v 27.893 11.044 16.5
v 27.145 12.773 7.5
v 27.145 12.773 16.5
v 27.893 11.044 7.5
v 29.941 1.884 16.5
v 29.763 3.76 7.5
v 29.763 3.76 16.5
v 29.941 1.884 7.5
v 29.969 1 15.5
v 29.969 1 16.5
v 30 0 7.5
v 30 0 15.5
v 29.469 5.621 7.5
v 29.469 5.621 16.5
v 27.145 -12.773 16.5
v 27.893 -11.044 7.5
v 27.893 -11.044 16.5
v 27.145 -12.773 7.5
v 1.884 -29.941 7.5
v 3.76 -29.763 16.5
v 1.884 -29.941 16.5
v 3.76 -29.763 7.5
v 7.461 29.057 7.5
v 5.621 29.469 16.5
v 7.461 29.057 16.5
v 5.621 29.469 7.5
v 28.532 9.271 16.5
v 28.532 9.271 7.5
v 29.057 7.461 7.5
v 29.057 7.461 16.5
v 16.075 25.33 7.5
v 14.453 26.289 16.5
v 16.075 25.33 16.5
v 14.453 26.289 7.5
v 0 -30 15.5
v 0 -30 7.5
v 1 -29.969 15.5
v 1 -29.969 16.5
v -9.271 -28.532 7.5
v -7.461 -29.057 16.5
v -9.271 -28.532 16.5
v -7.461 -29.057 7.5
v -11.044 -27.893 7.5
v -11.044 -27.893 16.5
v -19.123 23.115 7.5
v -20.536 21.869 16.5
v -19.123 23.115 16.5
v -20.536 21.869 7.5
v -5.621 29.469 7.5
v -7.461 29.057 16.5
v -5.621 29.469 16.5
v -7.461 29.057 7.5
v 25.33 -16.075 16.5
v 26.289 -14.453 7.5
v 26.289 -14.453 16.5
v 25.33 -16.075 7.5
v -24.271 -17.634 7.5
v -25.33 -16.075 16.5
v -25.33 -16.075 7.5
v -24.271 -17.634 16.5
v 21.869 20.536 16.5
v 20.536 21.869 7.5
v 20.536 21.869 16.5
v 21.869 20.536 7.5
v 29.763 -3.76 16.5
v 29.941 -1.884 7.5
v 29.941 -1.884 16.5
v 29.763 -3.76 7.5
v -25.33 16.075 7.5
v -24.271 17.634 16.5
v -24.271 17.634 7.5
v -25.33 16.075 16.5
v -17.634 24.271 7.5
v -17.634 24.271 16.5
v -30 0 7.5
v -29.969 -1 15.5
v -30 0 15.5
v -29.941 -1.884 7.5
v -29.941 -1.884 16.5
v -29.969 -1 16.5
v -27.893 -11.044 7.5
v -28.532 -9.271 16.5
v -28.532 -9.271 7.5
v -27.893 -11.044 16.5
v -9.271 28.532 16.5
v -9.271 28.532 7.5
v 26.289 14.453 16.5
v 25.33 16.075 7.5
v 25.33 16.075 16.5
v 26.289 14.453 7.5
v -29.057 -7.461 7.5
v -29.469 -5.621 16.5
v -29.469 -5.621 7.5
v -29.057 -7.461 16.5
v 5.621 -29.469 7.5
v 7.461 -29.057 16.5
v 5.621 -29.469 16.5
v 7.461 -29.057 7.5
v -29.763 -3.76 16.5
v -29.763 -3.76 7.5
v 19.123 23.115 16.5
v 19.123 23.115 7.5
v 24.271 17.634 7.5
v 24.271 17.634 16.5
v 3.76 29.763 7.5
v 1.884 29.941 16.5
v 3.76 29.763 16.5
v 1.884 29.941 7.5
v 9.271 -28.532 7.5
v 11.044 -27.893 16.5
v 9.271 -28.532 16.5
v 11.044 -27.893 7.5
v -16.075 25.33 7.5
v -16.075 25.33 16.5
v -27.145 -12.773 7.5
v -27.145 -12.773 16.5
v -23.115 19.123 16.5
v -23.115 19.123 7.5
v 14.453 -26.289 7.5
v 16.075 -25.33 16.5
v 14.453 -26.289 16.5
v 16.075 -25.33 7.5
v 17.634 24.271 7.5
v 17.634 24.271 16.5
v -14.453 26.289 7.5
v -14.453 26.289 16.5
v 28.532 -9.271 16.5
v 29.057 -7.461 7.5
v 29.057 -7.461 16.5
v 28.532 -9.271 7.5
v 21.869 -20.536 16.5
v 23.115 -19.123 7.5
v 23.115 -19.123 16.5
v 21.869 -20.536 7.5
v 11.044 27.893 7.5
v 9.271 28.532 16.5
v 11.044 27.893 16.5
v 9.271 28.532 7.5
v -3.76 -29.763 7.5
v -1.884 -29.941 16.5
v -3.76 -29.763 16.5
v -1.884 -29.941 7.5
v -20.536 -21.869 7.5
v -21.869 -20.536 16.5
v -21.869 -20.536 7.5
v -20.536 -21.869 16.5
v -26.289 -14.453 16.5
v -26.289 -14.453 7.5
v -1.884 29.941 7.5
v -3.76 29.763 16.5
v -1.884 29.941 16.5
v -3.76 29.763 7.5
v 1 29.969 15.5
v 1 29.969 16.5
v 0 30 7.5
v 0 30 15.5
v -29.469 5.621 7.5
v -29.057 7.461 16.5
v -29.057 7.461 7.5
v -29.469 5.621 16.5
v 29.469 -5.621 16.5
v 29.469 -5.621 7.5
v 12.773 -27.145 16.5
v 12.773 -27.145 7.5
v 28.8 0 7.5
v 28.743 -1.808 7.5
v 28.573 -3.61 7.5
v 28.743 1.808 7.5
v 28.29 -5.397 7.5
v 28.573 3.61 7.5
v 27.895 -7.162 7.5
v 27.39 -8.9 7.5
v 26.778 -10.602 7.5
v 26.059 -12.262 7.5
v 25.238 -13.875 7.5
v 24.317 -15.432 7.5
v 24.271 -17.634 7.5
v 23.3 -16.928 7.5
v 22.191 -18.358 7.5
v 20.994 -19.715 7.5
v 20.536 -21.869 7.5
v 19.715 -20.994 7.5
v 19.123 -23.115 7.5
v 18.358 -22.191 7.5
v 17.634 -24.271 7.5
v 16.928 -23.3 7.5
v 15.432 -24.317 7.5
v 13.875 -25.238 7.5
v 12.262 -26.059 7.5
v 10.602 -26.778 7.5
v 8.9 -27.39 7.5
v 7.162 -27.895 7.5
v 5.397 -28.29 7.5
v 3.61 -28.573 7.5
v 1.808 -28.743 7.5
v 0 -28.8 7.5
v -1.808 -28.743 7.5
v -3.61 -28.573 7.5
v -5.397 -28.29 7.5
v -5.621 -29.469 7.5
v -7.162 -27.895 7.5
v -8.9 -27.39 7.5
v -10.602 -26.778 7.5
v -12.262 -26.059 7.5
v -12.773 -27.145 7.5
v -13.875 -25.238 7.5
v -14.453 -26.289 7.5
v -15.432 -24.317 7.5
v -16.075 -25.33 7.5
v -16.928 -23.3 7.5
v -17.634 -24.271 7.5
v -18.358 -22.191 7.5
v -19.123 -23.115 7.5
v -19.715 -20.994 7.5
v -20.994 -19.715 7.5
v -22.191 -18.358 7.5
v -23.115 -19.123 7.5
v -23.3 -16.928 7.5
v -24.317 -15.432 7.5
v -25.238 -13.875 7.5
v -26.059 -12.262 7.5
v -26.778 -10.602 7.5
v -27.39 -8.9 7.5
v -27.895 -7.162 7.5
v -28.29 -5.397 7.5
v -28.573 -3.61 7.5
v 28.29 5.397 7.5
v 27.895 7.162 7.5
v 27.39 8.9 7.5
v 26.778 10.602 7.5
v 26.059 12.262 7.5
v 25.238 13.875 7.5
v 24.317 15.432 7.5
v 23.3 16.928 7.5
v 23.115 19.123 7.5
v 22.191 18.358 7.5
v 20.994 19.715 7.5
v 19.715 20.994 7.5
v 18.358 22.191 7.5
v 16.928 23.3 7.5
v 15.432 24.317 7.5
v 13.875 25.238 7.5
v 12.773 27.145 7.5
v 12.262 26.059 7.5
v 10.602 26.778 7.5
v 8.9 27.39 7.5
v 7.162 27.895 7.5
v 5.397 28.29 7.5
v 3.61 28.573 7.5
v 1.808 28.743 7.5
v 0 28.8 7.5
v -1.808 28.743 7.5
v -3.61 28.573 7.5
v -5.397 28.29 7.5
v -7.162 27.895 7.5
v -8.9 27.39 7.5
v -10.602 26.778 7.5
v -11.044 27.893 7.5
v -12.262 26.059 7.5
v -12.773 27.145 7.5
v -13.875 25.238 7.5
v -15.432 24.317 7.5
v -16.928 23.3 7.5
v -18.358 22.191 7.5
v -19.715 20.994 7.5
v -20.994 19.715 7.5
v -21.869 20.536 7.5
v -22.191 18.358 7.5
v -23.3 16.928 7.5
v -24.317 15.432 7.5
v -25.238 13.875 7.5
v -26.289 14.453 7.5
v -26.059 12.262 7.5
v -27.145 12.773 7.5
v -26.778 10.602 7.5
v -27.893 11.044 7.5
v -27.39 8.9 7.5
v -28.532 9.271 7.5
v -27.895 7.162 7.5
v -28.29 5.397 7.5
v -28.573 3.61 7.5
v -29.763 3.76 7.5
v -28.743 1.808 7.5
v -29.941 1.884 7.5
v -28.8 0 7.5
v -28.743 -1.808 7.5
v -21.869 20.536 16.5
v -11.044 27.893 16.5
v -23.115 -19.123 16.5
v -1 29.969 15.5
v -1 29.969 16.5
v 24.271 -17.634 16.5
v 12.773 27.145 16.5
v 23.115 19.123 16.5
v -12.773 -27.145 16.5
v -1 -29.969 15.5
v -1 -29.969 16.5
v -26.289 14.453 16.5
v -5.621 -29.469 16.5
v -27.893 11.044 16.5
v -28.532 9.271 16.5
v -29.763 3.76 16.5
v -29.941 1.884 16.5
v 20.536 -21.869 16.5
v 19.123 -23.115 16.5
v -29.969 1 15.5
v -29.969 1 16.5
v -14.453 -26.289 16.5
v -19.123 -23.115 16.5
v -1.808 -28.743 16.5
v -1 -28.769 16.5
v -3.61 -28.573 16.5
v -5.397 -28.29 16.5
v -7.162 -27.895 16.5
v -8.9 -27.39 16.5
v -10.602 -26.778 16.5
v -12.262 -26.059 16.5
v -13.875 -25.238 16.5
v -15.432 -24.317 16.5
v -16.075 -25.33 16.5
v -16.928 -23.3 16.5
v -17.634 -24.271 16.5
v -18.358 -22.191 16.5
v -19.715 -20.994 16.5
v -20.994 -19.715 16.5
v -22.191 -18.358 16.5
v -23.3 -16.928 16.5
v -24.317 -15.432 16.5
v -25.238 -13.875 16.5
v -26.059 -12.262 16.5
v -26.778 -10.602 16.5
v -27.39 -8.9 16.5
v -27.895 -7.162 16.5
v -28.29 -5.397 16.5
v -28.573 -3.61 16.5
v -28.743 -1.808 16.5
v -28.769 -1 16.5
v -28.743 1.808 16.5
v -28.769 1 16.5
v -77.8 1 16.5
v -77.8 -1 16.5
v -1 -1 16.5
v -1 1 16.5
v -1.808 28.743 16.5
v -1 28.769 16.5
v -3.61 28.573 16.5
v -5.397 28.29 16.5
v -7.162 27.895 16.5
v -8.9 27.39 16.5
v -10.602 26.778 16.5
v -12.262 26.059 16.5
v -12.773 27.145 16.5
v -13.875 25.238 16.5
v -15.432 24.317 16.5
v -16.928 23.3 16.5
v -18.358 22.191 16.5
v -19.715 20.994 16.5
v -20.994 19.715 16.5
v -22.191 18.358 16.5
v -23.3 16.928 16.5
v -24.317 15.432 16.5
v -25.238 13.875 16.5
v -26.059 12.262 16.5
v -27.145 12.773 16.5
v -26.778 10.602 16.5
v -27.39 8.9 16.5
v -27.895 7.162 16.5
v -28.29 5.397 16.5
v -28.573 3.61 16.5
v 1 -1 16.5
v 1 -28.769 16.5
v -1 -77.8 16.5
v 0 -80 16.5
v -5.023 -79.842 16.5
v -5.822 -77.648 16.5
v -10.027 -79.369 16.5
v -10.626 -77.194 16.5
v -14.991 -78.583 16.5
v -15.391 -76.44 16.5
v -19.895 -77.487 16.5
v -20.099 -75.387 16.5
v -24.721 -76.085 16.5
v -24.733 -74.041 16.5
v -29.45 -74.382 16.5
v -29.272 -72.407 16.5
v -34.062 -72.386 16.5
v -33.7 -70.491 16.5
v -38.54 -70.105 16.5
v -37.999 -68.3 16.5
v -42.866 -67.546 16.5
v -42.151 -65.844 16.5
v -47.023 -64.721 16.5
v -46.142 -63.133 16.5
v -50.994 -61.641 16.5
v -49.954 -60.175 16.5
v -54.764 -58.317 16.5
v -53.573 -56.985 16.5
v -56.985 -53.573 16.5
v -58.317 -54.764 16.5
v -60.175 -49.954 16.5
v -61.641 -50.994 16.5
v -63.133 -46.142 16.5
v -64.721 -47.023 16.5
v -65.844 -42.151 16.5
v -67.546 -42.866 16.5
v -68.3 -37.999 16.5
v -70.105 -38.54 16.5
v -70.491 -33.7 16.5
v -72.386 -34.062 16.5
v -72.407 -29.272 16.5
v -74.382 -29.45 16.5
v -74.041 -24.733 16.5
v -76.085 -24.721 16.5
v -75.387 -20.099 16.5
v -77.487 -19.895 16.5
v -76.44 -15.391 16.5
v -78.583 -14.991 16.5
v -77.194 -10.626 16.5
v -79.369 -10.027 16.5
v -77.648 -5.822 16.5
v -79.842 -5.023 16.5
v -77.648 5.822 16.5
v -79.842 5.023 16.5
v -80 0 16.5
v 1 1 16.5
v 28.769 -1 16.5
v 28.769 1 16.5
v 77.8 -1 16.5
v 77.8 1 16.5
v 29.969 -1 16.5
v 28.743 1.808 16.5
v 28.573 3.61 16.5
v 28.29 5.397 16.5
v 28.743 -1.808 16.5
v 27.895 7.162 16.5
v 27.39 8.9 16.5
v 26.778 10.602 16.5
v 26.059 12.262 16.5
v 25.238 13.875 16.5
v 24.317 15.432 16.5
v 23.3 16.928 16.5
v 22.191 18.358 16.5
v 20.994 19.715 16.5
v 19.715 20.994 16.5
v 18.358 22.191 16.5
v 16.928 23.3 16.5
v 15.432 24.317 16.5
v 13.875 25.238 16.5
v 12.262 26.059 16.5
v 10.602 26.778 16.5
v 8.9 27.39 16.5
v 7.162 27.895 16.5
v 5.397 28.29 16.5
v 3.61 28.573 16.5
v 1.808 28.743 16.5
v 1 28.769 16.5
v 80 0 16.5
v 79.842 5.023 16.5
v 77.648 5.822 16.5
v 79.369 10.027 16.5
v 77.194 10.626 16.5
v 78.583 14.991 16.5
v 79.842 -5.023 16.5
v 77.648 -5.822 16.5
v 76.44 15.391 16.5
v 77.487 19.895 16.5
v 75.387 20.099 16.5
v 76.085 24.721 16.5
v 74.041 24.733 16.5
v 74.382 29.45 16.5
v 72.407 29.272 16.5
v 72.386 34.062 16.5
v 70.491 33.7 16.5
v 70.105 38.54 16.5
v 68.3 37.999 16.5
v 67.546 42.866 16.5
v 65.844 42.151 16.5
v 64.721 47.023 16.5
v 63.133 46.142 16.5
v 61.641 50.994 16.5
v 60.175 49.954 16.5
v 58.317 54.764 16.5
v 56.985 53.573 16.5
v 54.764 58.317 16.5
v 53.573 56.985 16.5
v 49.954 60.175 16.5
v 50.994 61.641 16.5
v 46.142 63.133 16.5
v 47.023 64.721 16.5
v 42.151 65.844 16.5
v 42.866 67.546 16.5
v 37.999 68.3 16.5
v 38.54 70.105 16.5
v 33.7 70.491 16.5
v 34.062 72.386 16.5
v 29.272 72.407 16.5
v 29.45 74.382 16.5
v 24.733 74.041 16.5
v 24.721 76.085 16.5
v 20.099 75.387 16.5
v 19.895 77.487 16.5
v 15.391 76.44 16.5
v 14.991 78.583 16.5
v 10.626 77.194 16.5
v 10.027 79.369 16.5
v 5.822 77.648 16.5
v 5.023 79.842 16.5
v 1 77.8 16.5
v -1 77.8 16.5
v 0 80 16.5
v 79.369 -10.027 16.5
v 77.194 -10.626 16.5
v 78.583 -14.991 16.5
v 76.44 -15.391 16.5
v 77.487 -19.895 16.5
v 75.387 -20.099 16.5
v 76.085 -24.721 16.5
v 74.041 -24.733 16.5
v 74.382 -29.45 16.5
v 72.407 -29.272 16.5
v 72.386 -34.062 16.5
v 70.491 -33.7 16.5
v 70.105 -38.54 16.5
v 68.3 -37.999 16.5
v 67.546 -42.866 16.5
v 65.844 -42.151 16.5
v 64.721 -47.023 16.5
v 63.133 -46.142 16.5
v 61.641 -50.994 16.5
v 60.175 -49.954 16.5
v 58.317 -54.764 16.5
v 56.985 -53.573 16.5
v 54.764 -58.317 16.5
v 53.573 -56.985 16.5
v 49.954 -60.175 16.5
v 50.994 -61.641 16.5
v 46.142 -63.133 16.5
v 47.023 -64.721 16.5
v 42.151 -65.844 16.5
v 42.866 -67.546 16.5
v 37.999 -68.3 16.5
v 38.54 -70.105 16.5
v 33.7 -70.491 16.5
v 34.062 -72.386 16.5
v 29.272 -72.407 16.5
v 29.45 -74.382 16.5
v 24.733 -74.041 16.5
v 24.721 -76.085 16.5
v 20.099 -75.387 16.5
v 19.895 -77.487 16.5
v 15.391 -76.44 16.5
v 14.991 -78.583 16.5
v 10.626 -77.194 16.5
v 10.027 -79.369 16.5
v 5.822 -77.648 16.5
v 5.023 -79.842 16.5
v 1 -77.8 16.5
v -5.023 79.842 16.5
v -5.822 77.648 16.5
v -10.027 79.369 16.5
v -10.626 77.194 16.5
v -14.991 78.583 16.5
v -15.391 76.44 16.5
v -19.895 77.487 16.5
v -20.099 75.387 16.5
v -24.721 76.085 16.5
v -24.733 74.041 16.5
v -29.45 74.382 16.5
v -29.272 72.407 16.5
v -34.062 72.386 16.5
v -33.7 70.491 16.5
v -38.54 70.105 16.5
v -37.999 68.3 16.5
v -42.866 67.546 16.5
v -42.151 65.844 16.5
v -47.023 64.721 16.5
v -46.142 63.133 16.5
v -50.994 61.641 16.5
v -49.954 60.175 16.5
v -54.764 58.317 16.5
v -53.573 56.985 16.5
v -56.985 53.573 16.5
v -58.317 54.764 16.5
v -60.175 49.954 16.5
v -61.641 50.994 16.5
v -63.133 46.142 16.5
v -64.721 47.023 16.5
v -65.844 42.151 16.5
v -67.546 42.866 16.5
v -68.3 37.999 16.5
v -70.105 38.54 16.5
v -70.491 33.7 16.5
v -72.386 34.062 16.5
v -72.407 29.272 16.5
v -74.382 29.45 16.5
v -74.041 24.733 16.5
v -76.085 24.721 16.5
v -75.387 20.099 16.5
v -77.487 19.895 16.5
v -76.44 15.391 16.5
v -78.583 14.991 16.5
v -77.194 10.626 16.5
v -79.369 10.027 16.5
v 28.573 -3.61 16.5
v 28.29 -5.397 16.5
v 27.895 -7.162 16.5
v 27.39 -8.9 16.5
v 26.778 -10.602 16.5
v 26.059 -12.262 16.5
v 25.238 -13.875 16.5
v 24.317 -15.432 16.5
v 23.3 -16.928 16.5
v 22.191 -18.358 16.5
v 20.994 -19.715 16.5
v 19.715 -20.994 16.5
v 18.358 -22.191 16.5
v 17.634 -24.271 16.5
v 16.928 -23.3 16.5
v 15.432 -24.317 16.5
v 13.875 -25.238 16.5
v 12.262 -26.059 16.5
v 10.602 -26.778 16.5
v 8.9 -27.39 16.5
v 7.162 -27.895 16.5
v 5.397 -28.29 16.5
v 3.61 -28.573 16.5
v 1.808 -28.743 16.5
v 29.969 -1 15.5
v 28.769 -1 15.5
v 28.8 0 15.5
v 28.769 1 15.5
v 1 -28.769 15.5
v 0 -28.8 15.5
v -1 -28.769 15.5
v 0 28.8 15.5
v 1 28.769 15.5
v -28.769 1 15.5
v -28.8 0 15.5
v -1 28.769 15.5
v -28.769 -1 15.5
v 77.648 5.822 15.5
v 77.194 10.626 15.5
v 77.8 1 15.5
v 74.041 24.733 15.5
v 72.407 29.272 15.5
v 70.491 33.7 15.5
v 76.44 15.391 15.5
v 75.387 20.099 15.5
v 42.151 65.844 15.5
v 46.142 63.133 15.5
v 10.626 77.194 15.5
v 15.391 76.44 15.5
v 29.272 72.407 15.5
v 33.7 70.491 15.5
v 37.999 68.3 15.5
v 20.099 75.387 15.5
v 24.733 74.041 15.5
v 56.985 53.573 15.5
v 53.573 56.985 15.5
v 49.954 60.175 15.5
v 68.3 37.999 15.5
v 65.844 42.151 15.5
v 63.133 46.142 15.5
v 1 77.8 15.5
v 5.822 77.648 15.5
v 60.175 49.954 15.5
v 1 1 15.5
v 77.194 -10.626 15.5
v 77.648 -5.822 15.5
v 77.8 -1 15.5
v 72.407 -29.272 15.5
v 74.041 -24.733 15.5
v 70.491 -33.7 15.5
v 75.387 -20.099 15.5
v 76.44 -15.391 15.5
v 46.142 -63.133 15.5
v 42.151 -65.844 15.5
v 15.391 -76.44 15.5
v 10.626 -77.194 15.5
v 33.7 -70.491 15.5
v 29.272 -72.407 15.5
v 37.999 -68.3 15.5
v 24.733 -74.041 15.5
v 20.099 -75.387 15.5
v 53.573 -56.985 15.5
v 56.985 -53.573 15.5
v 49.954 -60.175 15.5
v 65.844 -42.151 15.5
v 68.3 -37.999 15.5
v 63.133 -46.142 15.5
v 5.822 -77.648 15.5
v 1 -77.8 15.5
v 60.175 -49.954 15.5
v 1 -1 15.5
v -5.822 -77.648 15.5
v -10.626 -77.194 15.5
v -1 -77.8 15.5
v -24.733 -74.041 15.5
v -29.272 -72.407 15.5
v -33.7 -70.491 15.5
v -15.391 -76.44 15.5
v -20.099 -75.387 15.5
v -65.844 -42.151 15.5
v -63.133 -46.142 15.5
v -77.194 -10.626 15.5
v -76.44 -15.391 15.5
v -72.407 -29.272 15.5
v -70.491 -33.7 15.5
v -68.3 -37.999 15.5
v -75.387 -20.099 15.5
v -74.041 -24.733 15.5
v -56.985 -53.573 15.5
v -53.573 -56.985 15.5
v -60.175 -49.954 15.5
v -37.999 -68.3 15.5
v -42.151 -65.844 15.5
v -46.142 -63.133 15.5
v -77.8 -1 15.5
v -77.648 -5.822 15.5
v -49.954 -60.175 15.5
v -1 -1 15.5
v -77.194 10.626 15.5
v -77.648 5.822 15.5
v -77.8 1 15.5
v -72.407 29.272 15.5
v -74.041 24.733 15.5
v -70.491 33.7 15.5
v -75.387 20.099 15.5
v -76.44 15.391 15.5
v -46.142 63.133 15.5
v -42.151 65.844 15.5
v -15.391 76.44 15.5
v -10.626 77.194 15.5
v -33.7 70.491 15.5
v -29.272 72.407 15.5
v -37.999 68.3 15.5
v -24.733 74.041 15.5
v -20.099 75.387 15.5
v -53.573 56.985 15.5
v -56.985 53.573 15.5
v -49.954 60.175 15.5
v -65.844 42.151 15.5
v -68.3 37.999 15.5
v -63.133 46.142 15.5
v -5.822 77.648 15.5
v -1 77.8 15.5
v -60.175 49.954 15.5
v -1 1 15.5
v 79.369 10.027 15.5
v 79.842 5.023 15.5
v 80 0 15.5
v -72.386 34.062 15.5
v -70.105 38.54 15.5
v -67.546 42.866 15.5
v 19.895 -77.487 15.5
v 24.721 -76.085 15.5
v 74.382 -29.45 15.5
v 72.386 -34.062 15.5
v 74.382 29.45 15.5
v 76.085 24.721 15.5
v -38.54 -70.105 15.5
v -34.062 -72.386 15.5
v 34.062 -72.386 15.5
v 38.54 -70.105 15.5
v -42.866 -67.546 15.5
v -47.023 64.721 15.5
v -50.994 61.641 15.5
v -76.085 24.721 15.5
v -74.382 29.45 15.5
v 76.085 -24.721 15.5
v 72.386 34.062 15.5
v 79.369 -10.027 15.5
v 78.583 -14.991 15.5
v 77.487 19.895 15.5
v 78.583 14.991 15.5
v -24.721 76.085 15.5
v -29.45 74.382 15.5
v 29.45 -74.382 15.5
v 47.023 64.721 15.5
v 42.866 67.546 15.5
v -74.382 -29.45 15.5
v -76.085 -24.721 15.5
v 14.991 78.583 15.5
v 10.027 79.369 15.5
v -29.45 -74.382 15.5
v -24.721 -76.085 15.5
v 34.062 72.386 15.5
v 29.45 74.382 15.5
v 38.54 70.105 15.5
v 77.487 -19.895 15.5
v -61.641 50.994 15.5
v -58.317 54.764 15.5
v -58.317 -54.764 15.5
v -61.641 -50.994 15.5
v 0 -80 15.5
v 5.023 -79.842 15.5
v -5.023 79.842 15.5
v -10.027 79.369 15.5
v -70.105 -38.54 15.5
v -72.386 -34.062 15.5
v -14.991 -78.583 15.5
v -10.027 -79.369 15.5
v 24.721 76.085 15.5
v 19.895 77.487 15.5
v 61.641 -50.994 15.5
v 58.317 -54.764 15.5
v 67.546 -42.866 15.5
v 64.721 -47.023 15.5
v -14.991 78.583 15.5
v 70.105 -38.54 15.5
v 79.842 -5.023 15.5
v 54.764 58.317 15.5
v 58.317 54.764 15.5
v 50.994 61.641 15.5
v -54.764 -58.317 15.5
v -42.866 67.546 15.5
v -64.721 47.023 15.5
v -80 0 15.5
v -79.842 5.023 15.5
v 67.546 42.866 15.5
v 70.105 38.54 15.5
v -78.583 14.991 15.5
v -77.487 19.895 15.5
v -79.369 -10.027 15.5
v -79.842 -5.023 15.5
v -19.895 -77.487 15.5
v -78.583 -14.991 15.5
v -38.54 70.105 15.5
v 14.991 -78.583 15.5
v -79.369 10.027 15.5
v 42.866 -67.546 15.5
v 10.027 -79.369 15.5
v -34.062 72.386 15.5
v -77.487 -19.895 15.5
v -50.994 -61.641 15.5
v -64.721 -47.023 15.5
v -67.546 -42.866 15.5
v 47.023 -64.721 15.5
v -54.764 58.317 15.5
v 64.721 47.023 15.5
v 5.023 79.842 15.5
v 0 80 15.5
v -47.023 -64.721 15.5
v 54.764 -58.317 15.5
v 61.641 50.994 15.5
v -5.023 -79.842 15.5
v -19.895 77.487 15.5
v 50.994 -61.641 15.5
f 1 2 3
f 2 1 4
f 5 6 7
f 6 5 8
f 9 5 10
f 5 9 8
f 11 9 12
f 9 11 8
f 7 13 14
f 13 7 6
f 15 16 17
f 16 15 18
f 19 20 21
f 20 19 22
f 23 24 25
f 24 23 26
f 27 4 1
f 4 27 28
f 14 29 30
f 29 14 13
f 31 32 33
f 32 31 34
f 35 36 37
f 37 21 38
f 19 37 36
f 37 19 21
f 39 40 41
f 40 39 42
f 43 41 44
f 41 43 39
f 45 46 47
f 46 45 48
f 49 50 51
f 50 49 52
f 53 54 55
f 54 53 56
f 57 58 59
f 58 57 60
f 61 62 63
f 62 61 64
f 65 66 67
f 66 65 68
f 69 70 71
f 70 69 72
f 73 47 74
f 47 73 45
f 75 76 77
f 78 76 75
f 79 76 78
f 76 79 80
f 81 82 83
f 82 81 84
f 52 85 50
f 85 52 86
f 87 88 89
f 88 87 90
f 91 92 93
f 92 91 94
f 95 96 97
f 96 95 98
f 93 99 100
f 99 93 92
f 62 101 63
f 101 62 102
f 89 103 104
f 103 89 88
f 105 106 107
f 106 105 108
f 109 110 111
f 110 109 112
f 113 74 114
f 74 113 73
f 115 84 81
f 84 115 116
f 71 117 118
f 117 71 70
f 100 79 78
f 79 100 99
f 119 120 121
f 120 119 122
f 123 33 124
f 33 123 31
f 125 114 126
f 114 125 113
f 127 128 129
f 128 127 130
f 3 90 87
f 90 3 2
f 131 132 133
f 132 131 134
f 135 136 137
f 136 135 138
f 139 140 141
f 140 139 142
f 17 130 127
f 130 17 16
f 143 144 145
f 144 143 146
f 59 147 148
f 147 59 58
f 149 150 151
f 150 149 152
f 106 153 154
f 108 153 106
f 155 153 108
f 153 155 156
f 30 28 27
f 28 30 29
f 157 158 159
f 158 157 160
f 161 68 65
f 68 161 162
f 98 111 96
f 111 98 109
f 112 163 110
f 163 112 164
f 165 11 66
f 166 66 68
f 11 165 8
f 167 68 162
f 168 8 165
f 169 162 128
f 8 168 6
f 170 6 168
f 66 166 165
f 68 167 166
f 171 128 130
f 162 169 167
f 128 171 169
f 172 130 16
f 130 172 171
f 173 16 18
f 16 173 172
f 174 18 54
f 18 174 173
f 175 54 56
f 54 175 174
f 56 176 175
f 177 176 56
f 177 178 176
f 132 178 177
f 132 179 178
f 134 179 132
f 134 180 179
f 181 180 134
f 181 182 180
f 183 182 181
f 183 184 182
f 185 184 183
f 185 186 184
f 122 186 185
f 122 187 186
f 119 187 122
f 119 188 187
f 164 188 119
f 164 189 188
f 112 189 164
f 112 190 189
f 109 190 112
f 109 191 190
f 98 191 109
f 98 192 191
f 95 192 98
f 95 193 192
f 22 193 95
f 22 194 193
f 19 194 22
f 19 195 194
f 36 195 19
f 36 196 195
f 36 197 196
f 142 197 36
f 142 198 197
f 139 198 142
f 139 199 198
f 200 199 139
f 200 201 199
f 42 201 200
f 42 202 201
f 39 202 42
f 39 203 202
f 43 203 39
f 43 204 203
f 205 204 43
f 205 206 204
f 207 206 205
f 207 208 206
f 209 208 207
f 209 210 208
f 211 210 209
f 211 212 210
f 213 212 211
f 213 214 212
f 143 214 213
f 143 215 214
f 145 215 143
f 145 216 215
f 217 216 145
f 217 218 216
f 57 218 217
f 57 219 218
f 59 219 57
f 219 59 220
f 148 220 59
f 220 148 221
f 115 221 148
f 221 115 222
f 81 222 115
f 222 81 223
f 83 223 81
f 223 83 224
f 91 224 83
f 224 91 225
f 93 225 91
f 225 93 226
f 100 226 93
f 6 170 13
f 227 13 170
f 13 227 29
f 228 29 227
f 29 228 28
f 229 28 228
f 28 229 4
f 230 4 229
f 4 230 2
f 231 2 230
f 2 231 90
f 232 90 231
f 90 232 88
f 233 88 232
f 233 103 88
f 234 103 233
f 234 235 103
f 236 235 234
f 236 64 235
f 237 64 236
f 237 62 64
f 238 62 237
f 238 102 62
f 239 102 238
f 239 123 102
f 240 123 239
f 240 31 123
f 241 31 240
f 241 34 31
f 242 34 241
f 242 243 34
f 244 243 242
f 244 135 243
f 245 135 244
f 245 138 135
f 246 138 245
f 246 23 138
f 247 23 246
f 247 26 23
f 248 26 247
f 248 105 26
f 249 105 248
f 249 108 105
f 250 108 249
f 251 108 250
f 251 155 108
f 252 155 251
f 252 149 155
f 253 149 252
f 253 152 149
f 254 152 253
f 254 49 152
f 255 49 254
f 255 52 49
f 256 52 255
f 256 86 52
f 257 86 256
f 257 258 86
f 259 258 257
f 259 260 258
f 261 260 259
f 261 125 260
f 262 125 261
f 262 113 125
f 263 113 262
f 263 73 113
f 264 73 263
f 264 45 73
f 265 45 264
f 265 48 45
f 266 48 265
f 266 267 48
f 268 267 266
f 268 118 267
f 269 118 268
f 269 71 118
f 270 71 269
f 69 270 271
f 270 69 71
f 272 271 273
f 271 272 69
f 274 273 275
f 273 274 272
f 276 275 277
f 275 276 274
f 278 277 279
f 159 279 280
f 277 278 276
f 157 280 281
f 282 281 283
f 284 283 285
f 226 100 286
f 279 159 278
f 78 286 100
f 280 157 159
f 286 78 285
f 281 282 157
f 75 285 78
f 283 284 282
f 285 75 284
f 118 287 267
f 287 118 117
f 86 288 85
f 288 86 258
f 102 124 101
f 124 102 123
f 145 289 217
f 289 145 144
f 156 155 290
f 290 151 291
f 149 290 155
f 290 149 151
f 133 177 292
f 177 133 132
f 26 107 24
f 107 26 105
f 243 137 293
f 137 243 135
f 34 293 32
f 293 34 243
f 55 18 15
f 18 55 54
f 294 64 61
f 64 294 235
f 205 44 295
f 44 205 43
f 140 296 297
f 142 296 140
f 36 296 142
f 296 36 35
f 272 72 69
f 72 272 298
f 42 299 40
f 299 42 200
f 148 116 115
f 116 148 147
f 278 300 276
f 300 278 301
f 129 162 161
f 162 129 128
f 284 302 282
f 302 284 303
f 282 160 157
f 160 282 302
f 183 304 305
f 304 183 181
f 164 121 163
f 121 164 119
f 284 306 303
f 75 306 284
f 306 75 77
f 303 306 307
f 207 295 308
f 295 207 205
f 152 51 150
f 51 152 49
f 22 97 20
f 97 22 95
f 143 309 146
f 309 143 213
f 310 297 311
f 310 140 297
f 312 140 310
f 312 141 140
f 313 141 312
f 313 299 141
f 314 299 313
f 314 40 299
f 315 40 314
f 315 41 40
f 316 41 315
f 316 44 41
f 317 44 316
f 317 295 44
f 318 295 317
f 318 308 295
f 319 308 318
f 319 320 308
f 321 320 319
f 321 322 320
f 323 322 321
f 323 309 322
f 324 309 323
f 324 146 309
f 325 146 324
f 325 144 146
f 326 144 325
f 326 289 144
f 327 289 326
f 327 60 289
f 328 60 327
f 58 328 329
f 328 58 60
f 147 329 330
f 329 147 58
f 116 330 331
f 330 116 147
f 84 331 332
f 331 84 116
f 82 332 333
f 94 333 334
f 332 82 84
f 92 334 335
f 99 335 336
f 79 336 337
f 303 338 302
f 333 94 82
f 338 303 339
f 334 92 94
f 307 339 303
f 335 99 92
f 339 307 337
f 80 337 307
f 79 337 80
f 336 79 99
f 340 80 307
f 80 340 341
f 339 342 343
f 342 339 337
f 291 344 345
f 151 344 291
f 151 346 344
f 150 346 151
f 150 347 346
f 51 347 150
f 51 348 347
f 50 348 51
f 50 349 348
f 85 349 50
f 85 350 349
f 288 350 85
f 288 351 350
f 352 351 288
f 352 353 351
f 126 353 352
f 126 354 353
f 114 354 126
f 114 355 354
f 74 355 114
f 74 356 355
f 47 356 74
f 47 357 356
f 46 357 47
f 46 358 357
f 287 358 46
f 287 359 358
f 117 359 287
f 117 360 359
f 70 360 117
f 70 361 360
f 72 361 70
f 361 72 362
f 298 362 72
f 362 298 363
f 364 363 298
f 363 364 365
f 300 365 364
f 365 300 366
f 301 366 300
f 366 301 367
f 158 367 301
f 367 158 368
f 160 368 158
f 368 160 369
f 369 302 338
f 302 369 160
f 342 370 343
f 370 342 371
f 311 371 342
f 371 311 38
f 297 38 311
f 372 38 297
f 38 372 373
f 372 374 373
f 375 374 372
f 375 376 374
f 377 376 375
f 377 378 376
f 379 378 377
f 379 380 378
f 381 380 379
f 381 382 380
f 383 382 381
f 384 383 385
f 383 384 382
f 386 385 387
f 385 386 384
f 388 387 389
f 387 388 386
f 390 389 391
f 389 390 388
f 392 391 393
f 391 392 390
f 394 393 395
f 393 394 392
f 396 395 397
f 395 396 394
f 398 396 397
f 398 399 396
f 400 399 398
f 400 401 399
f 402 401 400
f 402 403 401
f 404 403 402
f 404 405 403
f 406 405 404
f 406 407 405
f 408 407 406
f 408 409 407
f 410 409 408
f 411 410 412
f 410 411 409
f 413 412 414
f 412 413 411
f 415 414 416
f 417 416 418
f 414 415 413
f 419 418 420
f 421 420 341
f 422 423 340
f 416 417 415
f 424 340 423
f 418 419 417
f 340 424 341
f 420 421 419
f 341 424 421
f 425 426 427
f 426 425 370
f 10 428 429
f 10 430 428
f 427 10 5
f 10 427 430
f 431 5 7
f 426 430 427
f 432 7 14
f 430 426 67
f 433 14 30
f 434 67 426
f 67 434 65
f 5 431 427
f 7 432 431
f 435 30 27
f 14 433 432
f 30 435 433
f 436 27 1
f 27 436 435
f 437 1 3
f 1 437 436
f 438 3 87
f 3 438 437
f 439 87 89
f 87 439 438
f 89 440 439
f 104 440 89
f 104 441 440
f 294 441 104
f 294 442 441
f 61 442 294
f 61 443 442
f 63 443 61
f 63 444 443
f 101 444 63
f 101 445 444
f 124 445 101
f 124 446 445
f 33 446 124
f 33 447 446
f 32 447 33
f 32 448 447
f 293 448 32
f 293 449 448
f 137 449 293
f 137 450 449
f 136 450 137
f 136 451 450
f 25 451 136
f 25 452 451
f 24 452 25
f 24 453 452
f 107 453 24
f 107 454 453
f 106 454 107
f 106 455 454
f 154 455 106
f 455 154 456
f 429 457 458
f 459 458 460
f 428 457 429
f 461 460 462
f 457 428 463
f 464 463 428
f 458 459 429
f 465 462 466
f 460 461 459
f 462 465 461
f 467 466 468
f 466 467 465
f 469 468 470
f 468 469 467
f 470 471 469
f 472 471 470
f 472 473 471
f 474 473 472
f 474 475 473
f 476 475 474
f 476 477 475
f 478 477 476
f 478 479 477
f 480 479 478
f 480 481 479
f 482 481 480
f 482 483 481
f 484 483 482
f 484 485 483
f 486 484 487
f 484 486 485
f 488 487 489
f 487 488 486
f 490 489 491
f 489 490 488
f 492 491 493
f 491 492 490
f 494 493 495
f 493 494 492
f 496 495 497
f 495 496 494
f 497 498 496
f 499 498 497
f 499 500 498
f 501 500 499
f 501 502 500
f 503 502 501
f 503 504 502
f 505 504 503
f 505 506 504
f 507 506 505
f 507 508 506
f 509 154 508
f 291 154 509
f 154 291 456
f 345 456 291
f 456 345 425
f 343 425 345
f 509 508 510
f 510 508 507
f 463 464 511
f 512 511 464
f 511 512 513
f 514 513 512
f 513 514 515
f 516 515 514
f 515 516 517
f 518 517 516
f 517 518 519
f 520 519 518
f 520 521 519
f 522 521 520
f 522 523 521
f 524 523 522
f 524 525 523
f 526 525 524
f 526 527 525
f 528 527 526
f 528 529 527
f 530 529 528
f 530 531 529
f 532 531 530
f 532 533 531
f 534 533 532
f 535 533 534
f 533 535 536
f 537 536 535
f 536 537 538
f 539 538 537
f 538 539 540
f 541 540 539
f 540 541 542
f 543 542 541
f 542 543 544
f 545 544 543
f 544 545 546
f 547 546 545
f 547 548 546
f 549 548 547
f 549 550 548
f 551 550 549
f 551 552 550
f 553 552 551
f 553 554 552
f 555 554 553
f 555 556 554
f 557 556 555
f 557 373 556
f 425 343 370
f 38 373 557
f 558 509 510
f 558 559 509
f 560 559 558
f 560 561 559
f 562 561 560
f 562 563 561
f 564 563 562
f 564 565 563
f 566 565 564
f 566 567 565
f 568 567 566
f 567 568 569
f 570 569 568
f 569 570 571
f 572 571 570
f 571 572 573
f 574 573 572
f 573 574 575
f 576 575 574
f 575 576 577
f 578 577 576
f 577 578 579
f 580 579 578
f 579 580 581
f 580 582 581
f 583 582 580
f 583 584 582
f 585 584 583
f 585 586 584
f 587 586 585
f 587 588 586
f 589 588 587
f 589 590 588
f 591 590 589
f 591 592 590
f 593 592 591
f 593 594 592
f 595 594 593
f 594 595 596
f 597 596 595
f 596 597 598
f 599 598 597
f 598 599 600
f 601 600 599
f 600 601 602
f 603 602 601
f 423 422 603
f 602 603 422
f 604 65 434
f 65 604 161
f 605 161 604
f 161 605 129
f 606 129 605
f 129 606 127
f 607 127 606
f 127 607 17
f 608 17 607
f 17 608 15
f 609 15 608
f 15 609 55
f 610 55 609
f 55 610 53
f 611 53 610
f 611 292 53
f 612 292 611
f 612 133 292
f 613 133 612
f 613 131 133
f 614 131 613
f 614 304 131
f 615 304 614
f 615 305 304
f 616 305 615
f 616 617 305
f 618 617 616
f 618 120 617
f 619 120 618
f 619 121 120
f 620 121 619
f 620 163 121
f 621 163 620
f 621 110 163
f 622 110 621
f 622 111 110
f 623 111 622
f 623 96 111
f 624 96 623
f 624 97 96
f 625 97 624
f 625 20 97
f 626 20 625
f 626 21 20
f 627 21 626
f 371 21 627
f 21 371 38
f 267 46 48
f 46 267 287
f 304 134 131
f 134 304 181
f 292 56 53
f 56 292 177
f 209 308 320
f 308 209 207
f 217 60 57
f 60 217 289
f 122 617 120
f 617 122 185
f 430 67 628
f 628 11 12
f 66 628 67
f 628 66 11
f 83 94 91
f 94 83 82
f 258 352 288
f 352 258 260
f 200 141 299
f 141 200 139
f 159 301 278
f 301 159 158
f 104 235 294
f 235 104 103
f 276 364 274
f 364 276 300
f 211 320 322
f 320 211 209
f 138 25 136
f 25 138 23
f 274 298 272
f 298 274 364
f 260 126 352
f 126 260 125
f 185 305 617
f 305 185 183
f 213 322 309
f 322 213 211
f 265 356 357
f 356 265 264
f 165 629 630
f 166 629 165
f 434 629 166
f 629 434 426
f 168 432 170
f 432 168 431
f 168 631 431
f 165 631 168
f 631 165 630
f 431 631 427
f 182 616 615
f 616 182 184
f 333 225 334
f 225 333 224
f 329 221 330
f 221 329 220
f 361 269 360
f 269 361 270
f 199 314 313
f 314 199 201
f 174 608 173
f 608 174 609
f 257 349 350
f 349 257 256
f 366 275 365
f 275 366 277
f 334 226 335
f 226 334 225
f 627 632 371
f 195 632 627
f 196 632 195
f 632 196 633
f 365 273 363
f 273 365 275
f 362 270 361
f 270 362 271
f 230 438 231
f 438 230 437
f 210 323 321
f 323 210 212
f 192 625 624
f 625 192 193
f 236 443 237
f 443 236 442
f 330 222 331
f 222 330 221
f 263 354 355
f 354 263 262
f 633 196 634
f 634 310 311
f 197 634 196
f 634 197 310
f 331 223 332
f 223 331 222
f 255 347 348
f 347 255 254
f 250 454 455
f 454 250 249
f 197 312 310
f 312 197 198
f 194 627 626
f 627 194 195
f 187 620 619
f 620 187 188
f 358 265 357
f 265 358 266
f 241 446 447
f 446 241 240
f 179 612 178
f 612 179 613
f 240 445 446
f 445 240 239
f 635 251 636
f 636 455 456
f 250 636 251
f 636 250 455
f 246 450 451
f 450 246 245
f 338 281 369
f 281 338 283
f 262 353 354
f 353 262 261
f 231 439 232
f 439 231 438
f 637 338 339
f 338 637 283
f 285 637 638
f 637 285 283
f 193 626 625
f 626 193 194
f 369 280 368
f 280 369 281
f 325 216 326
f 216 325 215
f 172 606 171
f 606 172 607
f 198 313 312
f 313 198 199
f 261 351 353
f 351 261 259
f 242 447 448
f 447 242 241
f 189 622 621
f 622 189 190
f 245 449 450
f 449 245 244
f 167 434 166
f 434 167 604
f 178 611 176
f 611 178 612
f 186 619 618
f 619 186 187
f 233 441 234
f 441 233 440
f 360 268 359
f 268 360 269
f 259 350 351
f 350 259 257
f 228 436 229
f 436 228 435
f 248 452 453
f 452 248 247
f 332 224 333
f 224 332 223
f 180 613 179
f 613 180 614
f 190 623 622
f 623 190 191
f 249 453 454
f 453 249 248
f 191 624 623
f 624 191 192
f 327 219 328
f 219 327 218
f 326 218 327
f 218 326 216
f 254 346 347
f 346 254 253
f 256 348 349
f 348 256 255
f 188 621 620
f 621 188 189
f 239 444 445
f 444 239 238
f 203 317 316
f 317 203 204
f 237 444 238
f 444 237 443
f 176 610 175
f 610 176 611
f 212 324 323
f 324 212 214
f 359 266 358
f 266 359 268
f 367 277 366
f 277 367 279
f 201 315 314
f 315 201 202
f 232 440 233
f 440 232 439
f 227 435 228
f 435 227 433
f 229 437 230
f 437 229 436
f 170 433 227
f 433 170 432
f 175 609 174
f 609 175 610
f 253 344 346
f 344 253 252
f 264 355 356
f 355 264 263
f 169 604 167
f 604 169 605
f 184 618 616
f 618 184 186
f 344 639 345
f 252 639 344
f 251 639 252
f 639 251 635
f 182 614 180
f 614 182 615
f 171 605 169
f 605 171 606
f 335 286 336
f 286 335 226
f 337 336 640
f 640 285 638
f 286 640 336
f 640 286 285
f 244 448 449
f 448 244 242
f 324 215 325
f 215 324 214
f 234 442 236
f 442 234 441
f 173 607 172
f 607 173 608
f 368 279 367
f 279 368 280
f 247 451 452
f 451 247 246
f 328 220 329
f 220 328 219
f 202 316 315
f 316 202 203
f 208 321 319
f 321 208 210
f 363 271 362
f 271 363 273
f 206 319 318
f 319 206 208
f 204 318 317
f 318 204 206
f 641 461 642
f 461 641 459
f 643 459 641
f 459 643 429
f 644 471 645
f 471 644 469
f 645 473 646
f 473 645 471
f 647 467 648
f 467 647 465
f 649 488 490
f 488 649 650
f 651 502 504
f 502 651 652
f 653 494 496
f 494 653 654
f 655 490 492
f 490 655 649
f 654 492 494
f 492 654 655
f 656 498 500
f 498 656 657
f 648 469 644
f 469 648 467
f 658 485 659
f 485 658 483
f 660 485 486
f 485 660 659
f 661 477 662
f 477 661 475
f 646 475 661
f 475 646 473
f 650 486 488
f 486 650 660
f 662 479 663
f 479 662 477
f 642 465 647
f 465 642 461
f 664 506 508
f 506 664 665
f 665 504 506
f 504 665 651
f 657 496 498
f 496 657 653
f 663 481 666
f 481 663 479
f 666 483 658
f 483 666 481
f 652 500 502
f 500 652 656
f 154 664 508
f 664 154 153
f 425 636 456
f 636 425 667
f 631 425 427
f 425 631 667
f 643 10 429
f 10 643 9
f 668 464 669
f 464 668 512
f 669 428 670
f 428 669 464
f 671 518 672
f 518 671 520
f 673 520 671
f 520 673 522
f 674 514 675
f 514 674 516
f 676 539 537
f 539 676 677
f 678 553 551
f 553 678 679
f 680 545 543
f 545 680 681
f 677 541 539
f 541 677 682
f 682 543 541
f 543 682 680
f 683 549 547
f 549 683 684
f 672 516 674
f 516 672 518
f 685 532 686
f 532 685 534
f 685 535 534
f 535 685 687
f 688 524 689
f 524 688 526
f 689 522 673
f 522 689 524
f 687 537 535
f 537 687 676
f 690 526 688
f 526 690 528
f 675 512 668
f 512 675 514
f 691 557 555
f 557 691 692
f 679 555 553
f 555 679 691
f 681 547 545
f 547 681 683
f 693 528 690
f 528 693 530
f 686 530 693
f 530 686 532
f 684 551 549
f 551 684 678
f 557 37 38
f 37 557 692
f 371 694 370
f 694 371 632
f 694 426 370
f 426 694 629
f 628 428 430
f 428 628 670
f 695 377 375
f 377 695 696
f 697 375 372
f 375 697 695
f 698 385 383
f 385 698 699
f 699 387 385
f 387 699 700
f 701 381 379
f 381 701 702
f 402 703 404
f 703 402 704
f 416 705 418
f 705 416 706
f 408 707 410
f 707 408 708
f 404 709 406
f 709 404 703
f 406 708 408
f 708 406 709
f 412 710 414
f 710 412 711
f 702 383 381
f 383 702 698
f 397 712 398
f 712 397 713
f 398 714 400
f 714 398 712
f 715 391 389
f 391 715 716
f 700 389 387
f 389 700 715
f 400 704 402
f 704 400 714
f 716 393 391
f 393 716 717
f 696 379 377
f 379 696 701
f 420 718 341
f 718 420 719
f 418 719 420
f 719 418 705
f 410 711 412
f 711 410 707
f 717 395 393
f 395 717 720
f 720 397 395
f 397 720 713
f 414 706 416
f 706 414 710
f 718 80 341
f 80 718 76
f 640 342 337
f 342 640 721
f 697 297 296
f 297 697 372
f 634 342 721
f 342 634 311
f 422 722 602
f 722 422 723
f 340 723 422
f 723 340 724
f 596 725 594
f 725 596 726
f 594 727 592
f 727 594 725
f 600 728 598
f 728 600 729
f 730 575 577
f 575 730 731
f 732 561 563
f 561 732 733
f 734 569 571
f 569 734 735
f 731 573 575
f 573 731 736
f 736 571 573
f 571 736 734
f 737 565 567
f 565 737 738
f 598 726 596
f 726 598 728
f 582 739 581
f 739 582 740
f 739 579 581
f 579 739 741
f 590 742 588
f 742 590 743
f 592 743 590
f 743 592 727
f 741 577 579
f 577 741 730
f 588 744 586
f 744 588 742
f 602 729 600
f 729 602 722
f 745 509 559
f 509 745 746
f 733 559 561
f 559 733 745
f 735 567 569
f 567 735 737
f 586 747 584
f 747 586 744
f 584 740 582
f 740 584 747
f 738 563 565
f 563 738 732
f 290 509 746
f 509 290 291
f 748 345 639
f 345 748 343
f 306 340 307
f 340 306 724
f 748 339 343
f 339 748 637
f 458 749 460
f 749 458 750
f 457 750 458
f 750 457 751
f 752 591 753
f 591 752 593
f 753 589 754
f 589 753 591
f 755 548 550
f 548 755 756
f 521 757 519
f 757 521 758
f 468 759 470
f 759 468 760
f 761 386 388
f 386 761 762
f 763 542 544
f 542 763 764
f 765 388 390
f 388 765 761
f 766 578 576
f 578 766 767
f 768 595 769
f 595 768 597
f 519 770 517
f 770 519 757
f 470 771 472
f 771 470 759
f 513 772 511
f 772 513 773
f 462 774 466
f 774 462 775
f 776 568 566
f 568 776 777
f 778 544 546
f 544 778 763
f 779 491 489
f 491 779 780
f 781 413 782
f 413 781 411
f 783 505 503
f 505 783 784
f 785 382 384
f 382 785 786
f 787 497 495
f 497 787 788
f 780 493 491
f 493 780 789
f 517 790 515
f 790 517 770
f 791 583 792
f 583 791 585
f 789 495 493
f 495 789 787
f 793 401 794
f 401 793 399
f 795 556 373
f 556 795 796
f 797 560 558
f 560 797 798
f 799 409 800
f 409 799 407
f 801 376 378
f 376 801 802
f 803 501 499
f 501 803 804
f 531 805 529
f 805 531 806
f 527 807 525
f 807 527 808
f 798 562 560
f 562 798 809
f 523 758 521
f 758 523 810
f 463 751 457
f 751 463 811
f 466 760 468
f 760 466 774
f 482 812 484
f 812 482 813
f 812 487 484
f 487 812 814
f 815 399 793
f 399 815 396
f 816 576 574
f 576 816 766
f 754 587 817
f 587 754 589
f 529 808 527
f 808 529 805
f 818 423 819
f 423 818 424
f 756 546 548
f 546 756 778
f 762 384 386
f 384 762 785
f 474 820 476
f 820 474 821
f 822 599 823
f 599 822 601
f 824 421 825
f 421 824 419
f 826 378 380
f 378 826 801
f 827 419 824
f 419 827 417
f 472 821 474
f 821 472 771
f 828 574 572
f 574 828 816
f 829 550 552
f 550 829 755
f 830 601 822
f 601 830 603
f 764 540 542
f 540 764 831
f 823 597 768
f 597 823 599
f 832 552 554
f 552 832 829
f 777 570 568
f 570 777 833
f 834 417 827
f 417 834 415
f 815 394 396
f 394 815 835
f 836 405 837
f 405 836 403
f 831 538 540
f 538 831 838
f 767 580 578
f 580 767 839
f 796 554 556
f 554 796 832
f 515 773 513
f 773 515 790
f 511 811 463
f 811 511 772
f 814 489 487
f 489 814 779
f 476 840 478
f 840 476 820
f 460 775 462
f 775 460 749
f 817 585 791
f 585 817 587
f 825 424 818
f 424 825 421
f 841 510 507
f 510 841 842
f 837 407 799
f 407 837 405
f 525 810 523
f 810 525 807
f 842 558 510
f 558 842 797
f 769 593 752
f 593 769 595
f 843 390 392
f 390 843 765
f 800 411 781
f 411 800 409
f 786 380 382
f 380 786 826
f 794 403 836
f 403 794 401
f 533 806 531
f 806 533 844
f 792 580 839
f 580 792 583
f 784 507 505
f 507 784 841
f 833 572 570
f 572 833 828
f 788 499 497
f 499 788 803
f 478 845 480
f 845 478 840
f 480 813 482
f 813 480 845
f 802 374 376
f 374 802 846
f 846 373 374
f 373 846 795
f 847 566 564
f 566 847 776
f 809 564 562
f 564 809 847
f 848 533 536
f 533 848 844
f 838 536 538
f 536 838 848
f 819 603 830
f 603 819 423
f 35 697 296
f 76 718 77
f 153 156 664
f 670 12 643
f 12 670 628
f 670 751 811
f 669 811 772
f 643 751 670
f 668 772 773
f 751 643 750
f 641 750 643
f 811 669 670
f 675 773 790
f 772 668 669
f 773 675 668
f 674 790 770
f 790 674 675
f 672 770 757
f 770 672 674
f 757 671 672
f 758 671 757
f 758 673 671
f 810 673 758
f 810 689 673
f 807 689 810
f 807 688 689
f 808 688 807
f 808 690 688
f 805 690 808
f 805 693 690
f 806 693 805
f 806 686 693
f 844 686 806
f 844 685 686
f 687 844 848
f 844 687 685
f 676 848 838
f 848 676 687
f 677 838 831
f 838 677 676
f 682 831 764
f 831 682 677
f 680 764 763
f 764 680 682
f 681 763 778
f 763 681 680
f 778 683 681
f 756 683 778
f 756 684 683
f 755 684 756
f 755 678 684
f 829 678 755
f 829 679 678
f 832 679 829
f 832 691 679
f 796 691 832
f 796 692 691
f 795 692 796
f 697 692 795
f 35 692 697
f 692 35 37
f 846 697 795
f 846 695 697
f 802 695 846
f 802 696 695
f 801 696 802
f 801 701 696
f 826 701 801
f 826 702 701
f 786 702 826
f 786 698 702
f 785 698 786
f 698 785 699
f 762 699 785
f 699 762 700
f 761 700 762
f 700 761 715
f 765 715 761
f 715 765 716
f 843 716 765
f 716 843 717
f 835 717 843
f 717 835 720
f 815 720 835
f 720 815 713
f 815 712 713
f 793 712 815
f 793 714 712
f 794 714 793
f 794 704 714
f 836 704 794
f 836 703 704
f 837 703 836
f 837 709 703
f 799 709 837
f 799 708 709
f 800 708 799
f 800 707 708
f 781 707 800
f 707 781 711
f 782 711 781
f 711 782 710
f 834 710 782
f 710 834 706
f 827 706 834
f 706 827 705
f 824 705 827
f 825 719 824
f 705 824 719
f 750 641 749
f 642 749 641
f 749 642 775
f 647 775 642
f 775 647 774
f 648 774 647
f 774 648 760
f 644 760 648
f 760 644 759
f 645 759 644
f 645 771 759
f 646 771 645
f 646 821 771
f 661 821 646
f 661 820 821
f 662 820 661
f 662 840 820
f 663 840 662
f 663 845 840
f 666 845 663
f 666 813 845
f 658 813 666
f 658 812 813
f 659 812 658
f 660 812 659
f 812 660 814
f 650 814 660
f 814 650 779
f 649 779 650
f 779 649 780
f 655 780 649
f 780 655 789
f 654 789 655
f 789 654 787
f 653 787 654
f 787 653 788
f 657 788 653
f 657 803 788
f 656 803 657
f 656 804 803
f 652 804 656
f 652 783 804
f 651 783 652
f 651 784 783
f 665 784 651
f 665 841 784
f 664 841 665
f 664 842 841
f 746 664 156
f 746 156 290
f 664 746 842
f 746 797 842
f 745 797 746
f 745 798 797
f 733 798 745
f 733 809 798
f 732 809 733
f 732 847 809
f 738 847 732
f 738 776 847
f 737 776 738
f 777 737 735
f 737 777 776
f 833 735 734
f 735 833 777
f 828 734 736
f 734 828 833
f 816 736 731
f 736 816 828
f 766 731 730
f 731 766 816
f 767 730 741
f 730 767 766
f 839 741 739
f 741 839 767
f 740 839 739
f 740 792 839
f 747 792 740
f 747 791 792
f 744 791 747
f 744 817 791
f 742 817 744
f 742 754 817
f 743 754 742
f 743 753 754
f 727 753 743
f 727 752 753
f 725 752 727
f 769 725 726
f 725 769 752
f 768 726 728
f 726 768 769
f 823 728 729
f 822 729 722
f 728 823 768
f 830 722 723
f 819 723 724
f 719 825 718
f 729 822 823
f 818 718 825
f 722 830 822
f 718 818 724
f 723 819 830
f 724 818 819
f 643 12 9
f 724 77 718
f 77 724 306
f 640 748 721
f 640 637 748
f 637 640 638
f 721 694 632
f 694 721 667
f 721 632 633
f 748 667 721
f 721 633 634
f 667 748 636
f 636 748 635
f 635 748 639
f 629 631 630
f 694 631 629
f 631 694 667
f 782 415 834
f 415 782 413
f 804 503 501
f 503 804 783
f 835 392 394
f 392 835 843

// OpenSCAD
/*
Amplifier Dimensions
http://www.dell.com/content/products/productdetails.aspx/alienware-graphics-amplifier
  Height: 6.831" - (173.5mm)
  Depth: 16.124" - (409.55mm)
  Width: 7.303" - (185.5mm)

  measured
  width: 160mm

  angle of side is about 95 degrees

Laptop Dimensions
  About 327 wide at middle
  About 235 deep at middle
  About 225 deep at side
  About 25 thick

*/
screw_hole_diameter = 4;
depth = screw_hole_diameter*2;
amplifier_width=160;
bracket_width=amplifier_width+depth;
screw_hole_offset = bracket_width/2.5;

module amplifier_support() {
  
  leg_width = depth/2;
  leg_height = 65;
  height=depth;
  
  difference() {
    union() {
      translate([-(depth/2), -(bracket_width/2), 0]) {
        cube([depth, bracket_width, height]);
      }

      translate([-(depth/2.2),(bracket_width/2)-leg_width,0]) {
        rotate([0,0,5]) {
          cube([leg_height, leg_width, height]);
        }
      }
      
      translate([-(depth/2),-(bracket_width/2)-0.01,0]) {
        rotate([0,0,-5]) {
          cube([leg_height, leg_width, height]);
        }
      }
    }

    translate([0,screw_hole_offset,0]) { cylinder(h=depth, d=screw_hole_diameter, $fn=20); }
    translate([0,-screw_hole_offset,0]) { cylinder(h=depth, d=screw_hole_diameter, $fn=20); }
  }

}

module brace() {

  brace_height = depth;
  // brace_height = 1;
  module corner_connection() {
    
    translate([-screw_hole_offset, -screw_hole_offset, 0]) {
      difference() {
        union() {
          translate([depth*0.5,0,0]) {
            cube([depth*1.6,depth,brace_height], center=true);
          }
          translate([screw_hole_offset/2,screw_hole_offset/2,0]) {
            rotate([0,0,45]) {
              cube([screw_hole_offset*1.4,depth,brace_height], center=true);
            }
          }
        }
        color("red") {
          rotate([0,90,0]) {
            translate([0,0,depth/2]) {
              cylinder(d=screw_hole_diameter, h=depth*2, center=true, $fn=20);
            }
          }
        }
      }
    }
  }

  difference() {
    center_hole_diameter = depth*10;
    union() {
      // center node
      cylinder(d=center_hole_diameter,h=brace_height, center=true, $fn=100);

      union() {
        mirror([0,0,0]) { corner_connection(); }
        mirror([0,1,0]) { corner_connection(); }
      }

      mirror([1,0,0]) {
        union() {
          mirror([0,0,0]) { corner_connection(); }
          mirror([0,1,0]) { corner_connection(); }
        }
      }
    }
    cylinder(h=depth, d=center_hole_diameter*0.80, center=true, $fn=50);
  }
}

module tray() {
  center_hole_diameter = depth*10;

  module draw_wedge() {
    translate([1,1,0]) {
      scale(0.96) {
        intersection() {
          cylinder(h=depth*2, d=center_hole_diameter*2, center=true, $fn=100);
          translate([0,0,-(depth/2)]) {
            cube([center_hole_diameter,center_hole_diameter,depth*2]);
          }
        }
      }
    }
  }

  module place_wedge() {
    translate([0,0,-1]) {
      draw_wedge();
    }
  }
  translate([0,0,depth*1.5]) {
    difference() {
      cylinder(h=depth+1, d=center_hole_diameter*0.75, center=true, $fn=100);
      cylinder(h=depth+1, d=center_hole_diameter*0.72, center=true, $fn=100);
    }  
  }
  translate([0,0,depth*2]) {
    difference() {
      cylinder(h=1, d=center_hole_diameter*2, center=true, $fn=100);
      union() {
        mirror([0,0,0]) { place_wedge(); }
        mirror([0,1,0]) { place_wedge(); }
        mirror([1,1,0]) { place_wedge(); }
        mirror([1,0,0]) { place_wedge(); }
      }
    }
  }

}

// amplifier_support();

// brace();

tray();
